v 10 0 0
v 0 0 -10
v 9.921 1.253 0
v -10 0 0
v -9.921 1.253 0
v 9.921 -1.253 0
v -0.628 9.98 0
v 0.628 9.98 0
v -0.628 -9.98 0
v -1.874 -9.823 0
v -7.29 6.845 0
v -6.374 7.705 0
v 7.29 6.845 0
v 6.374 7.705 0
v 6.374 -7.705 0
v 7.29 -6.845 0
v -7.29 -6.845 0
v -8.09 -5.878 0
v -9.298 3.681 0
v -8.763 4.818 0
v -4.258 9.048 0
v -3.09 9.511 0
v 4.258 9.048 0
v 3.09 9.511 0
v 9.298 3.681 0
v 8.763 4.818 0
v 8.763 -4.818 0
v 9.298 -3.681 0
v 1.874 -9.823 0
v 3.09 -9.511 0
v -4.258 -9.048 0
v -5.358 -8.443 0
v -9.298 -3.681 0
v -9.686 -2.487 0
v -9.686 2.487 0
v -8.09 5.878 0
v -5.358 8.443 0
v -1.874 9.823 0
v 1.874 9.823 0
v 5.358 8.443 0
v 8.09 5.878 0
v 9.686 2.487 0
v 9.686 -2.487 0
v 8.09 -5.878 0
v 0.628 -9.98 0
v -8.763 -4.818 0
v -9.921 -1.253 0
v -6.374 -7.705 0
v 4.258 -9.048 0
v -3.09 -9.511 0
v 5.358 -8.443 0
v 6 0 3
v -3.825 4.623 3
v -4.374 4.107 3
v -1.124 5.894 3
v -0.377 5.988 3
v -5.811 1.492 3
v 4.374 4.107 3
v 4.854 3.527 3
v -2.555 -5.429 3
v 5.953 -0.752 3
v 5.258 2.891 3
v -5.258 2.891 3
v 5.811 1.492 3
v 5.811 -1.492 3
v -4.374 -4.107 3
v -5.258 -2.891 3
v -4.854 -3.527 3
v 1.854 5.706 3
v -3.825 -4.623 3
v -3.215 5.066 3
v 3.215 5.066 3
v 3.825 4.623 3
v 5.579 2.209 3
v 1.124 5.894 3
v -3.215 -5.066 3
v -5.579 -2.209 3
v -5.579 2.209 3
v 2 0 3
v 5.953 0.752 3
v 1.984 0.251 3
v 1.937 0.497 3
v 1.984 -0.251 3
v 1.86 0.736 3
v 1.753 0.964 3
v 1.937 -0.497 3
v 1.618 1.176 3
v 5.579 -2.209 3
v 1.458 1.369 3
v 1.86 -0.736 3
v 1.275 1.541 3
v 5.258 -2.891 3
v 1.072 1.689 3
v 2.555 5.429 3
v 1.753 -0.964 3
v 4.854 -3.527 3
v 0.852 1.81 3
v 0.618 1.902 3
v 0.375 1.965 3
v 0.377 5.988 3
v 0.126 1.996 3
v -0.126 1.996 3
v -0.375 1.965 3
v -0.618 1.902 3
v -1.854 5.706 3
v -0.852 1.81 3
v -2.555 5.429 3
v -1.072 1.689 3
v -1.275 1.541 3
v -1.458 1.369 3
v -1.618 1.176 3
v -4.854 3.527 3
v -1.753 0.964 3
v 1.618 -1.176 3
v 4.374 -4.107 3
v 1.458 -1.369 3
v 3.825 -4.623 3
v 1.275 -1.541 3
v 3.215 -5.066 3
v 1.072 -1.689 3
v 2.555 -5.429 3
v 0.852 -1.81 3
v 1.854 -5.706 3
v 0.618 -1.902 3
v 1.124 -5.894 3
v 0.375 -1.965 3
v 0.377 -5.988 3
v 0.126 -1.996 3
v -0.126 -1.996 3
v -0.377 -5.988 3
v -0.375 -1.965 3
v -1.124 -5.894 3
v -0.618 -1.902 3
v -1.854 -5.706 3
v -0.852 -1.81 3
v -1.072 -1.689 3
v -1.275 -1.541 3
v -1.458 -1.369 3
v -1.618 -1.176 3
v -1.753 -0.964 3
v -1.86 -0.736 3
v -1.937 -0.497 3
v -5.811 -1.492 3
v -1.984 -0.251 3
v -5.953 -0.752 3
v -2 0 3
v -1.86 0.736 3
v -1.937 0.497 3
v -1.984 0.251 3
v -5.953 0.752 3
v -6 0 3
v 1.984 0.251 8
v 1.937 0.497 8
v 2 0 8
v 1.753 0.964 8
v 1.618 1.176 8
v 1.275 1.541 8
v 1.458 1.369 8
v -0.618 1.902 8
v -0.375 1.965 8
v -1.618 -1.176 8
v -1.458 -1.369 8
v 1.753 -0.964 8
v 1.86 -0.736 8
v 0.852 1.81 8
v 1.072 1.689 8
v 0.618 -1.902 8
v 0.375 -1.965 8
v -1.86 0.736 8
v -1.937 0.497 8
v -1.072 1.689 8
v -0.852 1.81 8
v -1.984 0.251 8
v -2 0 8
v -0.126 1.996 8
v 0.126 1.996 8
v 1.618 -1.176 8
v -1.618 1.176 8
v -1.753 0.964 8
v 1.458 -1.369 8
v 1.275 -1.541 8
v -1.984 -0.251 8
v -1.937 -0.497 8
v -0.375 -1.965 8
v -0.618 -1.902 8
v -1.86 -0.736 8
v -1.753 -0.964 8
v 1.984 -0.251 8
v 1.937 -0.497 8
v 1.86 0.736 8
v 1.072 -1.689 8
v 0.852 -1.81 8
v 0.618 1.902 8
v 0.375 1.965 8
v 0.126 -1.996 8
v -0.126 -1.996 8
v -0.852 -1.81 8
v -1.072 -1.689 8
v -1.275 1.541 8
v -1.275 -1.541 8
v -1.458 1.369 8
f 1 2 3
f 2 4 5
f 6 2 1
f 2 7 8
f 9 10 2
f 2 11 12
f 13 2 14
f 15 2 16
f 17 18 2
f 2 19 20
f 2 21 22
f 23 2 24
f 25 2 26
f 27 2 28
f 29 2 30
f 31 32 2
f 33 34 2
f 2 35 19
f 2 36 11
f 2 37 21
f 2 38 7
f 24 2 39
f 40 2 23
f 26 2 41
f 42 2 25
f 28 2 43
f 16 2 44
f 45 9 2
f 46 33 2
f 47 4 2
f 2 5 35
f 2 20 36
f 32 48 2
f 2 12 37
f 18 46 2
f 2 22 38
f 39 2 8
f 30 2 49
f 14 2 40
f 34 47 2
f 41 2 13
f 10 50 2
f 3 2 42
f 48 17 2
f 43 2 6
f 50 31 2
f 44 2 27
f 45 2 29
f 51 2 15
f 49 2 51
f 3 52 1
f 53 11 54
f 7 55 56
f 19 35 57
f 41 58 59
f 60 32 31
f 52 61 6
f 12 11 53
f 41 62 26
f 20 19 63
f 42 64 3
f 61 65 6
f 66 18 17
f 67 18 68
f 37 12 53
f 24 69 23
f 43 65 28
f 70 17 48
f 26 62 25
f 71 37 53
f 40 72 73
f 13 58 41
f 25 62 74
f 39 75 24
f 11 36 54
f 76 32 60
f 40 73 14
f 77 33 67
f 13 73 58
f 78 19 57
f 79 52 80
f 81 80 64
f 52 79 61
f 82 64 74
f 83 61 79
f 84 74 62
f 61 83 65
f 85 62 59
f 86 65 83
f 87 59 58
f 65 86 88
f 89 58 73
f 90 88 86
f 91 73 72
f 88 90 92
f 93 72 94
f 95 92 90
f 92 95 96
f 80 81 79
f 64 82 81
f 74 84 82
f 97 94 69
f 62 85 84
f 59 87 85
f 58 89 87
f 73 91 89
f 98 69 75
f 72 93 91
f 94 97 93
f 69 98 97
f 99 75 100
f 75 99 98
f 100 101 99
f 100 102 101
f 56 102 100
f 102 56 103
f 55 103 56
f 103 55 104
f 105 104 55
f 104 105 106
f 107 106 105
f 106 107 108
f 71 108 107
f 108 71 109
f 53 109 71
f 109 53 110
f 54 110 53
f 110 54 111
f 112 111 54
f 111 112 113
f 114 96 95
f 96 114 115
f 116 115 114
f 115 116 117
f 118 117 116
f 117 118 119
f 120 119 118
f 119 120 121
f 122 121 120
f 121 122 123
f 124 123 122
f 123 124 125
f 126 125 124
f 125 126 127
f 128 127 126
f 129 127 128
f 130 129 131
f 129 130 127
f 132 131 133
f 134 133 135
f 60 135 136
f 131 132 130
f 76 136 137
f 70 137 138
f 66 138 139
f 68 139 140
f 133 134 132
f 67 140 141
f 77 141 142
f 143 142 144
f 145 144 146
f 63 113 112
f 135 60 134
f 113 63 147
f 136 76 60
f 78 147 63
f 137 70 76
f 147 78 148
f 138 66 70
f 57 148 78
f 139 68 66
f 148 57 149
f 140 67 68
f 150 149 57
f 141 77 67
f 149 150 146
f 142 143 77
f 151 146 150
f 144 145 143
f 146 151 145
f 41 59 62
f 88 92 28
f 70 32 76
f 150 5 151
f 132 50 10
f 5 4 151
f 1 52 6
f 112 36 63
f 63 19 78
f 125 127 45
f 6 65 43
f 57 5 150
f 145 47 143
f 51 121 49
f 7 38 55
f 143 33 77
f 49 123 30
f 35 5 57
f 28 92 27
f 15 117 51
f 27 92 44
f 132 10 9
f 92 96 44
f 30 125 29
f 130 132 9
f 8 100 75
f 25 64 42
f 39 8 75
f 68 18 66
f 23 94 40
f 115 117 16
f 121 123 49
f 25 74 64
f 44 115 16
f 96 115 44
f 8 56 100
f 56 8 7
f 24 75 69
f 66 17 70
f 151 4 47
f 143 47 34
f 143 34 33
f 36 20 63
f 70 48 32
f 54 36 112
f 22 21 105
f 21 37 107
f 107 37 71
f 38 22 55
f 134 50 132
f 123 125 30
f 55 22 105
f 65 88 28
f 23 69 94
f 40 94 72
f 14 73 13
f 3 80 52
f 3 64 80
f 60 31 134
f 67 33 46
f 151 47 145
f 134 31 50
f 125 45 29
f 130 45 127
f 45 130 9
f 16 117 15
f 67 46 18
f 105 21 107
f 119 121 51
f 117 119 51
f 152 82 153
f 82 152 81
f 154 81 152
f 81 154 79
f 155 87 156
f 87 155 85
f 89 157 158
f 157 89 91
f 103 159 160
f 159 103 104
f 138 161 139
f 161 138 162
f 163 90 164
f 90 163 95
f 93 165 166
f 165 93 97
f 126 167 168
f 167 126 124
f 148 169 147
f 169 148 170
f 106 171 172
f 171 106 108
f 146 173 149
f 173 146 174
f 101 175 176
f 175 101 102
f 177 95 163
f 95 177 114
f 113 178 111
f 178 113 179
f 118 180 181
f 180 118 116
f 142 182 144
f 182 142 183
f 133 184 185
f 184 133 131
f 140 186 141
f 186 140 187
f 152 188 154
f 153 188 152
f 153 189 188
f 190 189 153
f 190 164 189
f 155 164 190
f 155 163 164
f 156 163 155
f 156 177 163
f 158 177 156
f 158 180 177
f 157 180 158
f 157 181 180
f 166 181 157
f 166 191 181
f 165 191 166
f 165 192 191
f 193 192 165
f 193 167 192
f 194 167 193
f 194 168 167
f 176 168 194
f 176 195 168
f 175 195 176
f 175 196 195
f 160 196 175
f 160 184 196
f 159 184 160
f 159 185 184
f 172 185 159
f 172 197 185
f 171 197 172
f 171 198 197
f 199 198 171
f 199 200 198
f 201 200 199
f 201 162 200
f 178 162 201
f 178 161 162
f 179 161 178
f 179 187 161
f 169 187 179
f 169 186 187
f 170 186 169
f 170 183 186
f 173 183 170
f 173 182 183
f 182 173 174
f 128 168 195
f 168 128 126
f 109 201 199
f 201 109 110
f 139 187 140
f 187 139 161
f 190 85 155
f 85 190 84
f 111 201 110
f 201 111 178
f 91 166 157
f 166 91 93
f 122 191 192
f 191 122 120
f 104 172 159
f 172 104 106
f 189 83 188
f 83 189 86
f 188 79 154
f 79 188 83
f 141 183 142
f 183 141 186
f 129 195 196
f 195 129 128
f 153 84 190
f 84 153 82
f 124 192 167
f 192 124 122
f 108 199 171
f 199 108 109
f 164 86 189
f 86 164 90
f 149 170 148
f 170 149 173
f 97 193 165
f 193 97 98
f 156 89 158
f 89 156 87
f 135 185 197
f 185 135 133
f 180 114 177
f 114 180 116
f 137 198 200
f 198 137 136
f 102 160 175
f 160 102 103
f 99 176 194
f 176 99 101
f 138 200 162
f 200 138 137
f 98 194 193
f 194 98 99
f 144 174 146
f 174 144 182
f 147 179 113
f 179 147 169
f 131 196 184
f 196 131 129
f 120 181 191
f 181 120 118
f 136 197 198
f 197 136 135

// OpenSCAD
$fn=50;
union() {
  translate([0, 0, -5]) {
    cylinder(r1=0, r2=10, h=10, center=true);
  }
  translate([0, 0, 1.5]) {
    cylinder(r1=10, r2=6, h=3, center=true); 
  }
  translate([0, 0, 5]) {
    cylinder(r=2, h=6, center=true);
  }
}
